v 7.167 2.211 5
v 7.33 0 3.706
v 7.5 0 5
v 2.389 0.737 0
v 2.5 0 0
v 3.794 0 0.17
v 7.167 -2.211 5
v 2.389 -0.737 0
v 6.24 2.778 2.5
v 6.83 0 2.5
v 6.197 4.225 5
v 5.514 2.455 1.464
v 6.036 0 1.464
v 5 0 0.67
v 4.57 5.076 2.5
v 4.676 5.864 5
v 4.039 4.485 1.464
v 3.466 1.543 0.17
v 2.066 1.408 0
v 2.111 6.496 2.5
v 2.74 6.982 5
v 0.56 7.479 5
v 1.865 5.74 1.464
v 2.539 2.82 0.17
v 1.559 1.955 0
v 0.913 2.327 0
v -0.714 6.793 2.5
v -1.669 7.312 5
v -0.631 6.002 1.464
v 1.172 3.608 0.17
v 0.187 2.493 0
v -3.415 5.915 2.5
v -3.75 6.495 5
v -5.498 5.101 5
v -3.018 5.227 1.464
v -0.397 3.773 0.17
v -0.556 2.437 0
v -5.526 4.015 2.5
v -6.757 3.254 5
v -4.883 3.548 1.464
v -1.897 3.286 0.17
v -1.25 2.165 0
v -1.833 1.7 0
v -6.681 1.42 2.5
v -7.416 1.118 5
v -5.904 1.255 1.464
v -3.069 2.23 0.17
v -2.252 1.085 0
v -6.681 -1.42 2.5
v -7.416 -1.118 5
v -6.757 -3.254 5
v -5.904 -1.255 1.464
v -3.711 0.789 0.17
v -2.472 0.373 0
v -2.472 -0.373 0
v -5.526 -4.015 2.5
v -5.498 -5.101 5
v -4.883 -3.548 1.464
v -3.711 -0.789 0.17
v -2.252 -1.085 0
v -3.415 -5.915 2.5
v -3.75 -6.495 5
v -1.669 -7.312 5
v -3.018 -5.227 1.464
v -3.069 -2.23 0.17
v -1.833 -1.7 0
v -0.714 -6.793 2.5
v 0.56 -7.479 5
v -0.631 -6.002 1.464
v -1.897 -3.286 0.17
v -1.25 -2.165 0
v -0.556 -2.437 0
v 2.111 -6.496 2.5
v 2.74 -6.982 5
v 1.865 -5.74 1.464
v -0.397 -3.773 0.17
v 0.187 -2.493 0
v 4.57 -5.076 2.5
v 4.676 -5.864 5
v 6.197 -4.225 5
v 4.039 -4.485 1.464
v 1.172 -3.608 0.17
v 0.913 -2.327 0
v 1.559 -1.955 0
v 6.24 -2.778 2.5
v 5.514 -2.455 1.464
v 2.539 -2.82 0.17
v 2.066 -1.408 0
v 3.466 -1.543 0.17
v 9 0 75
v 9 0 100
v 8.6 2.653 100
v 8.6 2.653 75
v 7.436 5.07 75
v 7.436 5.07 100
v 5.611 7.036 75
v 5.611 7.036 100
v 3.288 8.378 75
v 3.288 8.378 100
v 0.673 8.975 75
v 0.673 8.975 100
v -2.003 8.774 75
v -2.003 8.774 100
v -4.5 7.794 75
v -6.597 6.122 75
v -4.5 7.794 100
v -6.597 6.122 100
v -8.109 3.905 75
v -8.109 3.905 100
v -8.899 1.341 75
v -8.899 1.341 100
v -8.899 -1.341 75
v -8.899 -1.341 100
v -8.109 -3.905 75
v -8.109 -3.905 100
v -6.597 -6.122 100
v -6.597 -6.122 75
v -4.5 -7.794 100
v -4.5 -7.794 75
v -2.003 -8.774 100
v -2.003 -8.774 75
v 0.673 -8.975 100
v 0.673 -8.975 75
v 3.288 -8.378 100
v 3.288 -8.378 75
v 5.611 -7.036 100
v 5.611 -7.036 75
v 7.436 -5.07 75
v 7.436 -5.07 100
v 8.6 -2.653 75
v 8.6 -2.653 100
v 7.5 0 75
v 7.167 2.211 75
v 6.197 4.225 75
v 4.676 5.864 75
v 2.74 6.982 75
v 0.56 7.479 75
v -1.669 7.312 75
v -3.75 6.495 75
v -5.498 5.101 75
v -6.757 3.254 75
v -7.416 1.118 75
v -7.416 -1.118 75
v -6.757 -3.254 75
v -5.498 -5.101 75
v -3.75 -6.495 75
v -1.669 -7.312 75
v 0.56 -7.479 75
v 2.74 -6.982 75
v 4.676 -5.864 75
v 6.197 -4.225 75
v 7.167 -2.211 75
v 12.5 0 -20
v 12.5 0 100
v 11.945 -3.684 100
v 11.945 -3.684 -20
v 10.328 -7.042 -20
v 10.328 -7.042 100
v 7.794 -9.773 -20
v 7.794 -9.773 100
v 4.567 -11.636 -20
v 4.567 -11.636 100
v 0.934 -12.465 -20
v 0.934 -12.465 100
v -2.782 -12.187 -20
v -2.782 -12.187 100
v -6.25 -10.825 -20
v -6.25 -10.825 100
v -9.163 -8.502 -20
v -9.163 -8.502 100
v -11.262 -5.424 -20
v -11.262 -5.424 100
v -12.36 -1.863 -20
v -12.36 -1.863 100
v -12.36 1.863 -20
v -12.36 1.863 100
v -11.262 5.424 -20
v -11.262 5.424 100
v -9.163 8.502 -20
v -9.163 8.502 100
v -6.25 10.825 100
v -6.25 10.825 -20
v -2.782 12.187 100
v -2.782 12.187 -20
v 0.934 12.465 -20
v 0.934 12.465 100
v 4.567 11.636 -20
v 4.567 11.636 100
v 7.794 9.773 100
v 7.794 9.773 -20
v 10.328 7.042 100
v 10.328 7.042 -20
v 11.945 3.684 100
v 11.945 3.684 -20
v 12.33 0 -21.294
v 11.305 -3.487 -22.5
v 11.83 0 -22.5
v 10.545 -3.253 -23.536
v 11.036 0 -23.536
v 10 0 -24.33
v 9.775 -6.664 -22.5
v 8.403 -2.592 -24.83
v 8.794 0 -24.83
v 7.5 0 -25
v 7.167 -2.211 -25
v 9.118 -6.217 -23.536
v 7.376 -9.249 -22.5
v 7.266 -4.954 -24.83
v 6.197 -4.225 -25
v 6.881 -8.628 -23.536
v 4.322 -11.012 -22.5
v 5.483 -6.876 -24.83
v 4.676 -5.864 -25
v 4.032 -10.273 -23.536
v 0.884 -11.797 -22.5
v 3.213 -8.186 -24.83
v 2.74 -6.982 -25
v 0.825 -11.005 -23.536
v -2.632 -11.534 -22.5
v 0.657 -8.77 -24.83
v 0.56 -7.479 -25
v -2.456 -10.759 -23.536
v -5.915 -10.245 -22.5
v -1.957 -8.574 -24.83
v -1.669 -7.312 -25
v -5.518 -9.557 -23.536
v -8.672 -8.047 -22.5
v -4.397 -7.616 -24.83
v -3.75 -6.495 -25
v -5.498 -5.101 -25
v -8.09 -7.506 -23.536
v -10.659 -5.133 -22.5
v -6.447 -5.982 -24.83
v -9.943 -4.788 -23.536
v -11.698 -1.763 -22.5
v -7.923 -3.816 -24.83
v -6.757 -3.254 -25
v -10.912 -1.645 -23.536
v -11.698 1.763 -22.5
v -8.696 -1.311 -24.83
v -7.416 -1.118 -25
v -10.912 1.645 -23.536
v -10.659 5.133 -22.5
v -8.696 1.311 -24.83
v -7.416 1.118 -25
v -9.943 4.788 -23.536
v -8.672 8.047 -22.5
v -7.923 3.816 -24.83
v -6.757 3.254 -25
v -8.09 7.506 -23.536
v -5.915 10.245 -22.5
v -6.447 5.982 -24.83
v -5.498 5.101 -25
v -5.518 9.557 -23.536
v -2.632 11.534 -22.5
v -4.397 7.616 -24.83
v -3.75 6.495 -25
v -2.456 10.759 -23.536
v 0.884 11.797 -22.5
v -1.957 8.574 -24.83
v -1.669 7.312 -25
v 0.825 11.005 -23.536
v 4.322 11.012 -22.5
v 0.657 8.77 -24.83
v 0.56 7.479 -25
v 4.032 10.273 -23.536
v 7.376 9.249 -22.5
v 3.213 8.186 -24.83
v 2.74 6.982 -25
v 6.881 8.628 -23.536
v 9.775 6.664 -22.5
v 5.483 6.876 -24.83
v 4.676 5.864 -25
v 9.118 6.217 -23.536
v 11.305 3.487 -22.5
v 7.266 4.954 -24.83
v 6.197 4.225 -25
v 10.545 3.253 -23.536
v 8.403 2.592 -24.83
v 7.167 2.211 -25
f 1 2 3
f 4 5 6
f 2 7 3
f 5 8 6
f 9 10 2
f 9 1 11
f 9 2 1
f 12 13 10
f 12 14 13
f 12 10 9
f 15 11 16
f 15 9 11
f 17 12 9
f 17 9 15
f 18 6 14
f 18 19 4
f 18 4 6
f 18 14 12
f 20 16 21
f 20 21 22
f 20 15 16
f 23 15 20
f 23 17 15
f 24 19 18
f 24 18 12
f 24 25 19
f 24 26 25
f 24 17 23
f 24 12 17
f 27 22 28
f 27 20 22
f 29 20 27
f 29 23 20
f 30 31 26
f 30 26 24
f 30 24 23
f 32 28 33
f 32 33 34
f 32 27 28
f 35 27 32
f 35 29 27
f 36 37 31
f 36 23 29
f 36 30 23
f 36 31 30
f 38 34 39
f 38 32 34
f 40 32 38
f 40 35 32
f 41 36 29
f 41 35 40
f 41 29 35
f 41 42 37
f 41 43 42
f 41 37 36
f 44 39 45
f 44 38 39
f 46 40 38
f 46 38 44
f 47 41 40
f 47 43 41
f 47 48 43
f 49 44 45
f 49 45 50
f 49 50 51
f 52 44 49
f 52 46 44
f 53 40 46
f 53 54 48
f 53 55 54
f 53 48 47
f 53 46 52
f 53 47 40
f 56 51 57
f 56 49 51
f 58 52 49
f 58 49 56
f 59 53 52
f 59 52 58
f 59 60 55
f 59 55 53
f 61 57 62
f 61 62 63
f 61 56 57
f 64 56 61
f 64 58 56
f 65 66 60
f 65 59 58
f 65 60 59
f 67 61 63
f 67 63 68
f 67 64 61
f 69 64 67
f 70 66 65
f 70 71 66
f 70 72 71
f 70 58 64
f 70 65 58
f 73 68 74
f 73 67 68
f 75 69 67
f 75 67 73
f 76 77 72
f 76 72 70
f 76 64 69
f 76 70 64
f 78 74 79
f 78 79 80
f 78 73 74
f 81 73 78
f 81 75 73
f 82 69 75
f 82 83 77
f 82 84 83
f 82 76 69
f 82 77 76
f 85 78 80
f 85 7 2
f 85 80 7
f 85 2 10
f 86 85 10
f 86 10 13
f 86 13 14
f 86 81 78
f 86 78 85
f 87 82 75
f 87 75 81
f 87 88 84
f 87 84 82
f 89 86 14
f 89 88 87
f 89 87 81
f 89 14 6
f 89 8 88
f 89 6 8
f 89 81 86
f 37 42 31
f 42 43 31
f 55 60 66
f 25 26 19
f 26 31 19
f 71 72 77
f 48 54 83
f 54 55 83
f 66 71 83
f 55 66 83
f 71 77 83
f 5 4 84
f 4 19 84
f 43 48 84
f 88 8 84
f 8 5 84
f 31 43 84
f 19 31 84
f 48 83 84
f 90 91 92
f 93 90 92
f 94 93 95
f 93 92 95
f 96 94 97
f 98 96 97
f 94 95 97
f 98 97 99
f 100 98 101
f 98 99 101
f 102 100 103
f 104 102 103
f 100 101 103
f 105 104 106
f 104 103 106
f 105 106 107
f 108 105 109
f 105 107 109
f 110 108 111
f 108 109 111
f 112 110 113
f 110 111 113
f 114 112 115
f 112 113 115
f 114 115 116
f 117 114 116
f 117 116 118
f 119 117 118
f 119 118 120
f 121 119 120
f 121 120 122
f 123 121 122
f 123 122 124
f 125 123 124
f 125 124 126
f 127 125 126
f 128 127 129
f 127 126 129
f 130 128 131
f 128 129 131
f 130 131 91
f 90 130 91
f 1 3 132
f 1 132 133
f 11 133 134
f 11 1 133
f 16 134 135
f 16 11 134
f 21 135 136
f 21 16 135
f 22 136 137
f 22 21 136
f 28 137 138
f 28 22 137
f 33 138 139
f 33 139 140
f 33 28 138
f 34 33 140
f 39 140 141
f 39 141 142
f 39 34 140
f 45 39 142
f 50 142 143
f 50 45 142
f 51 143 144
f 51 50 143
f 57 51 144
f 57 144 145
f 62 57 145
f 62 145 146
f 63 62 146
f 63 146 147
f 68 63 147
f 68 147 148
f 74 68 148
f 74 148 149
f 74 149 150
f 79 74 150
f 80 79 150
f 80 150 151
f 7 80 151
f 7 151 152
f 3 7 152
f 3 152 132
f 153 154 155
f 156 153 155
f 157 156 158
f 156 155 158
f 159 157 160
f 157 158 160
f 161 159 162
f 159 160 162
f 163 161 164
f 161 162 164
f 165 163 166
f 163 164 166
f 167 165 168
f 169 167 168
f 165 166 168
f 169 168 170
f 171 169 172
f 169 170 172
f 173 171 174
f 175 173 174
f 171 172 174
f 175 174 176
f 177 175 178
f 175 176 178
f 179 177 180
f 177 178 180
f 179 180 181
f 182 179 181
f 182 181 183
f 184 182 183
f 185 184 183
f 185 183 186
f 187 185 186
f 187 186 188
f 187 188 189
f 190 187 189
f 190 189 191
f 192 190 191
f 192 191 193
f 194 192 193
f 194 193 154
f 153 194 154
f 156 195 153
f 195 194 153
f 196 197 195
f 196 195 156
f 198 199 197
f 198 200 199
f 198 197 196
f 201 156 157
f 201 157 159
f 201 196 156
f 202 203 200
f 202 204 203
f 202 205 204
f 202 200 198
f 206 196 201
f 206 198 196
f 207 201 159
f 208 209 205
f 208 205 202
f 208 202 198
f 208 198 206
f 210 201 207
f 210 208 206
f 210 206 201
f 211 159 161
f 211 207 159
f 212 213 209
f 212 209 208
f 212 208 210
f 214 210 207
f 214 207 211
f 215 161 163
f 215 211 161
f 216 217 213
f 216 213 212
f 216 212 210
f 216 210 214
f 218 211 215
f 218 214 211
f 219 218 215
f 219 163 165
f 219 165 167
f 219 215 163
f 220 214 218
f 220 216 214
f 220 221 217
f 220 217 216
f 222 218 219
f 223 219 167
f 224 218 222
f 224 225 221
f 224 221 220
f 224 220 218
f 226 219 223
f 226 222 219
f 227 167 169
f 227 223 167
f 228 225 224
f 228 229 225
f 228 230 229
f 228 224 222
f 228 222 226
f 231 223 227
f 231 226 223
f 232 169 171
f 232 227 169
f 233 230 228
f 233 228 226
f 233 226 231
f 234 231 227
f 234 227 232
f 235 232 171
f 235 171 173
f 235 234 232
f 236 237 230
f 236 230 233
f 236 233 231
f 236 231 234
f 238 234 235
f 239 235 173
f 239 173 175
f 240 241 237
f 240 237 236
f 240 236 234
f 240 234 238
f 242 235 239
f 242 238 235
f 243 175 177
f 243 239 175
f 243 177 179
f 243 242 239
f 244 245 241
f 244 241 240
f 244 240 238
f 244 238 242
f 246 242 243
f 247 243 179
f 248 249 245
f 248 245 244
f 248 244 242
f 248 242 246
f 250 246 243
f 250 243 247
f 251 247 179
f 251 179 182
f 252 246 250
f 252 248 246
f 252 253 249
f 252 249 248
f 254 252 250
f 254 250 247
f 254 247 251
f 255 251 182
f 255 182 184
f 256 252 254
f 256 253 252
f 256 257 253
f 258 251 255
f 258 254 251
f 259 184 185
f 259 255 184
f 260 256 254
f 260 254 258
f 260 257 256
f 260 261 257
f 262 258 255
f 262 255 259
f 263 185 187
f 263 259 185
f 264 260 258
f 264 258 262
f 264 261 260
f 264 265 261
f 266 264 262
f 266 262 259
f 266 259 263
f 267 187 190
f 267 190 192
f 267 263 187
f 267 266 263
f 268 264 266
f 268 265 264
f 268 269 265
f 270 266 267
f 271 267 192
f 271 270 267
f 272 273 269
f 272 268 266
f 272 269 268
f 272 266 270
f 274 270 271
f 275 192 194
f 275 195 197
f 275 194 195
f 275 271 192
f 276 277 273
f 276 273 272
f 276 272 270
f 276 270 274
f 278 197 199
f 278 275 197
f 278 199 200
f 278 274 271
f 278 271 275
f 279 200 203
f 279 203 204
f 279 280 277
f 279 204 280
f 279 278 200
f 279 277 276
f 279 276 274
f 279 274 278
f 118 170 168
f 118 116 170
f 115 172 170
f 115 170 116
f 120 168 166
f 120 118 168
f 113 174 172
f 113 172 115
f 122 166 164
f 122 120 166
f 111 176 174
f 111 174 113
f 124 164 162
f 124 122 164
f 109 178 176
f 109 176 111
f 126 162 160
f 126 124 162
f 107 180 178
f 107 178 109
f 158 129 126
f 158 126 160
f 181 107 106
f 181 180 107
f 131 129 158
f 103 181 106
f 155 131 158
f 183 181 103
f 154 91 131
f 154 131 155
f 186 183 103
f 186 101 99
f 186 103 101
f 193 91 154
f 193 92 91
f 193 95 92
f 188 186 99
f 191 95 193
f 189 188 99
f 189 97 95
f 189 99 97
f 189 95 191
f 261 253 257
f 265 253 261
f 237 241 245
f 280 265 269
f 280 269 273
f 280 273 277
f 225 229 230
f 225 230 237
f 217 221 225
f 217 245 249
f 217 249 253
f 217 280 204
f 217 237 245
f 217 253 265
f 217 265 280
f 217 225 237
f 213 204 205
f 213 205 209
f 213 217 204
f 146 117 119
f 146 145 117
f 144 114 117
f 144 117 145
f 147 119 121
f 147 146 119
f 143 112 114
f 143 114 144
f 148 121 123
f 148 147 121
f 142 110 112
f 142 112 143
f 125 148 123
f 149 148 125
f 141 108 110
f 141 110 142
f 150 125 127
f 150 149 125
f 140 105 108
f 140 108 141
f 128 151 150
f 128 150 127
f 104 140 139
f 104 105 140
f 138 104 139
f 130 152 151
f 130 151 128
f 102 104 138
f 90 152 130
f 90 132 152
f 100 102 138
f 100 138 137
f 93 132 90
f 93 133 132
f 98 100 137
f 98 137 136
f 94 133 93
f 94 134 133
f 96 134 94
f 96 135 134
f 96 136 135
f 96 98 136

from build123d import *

# Parameters (mm, degrees)
F0_R     = 12.5
F0_R_2   = 7.5
F1_DEPTH = 100
F2_R     = 12.5
F3_DEPTH = 25
F4_R     = 5
F5_R     = 9
F5_R_2   = 7.5
F6_DEPTH = 25


with BuildPart() as f1:
    # F0 (on Top) → F1 (new body)
    with BuildSketch(Plane.XY):
        Circle(F0_R)
        Circle(F0_R_2, mode=Mode.SUBTRACT)
    extrude(amount=F1_DEPTH)

    # F2 (on face) → F3 (join)
    with BuildSketch(Plane(origin=(0, 0, 0), x_dir=(1, 0, 0), z_dir=(0, 0, -1))):
        Circle(F2_R)
    extrude(amount=F3_DEPTH)

    # F4
    f4_edges = [f1.edges().sort_by_distance(p)[0] for p in [
        (-12.5, 0, -25),
        (-7.5, 0, 0),
    ]]
    fillet(f4_edges, radius=F4_R)

    # F5 (on face) → F6 (cut)
    with BuildSketch(Plane.XY.offset(100)):
        Circle(F5_R)
        Circle(F5_R_2, mode=Mode.SUBTRACT)
    extrude(amount=-F6_DEPTH, mode=Mode.SUBTRACT)


solid = f1.part
